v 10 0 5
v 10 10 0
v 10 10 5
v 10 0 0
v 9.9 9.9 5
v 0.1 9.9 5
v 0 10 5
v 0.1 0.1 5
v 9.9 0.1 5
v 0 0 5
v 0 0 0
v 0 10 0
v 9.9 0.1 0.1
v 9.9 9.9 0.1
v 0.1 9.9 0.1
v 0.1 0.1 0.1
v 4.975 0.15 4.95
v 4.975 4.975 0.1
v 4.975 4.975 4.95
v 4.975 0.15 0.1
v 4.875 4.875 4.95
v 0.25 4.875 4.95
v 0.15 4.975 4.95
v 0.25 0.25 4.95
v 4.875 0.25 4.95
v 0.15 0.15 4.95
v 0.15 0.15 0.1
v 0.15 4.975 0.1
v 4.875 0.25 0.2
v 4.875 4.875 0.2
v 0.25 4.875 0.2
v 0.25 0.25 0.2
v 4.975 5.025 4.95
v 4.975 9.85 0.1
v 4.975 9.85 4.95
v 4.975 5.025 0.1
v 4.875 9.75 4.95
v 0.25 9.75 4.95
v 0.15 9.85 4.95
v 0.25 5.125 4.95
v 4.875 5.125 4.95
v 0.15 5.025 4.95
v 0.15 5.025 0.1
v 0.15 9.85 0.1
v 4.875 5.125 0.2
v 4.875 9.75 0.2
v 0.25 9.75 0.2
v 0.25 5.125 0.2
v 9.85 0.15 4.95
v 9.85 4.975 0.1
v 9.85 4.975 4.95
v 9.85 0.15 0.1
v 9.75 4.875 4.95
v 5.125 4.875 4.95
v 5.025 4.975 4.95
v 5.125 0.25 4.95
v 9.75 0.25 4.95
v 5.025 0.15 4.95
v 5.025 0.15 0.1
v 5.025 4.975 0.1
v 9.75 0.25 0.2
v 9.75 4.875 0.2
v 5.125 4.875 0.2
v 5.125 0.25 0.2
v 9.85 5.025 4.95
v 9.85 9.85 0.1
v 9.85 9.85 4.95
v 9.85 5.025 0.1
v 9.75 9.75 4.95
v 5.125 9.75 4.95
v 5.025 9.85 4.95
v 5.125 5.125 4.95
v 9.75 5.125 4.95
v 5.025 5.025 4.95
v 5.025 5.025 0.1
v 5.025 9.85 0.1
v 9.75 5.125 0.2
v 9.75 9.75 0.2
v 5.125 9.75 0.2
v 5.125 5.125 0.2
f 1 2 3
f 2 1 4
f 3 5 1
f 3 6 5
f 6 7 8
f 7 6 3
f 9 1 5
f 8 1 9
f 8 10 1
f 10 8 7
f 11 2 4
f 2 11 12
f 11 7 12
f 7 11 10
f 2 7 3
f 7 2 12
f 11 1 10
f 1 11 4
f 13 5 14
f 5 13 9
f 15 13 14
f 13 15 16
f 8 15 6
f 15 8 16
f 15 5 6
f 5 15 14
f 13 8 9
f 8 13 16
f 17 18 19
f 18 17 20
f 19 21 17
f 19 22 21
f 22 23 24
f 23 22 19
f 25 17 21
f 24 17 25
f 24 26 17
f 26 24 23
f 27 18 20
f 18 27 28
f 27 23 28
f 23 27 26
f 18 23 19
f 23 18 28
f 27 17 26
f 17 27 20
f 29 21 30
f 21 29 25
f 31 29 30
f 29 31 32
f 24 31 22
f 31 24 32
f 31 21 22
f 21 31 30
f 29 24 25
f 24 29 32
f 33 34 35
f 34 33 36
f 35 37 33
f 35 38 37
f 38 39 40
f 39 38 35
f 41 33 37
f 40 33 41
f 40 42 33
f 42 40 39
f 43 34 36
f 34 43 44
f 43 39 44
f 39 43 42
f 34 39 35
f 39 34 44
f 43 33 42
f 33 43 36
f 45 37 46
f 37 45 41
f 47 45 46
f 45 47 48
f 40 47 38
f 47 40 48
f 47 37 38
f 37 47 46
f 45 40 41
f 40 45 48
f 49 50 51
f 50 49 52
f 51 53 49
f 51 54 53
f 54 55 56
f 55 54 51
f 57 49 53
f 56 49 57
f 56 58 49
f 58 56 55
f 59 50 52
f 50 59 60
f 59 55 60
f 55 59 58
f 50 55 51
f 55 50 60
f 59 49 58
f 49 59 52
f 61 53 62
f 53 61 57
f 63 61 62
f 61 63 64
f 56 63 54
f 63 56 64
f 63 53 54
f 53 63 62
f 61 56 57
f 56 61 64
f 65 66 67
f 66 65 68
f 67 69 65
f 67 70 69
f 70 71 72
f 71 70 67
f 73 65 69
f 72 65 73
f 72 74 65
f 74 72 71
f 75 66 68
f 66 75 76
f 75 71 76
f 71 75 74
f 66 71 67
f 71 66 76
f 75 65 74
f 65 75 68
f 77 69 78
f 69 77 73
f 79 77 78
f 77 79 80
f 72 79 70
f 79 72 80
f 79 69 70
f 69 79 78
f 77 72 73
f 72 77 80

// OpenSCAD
/*
 * A basic organizer print of a box with four box inserts.
 *
 * Author: Tarkan Al-Kazily - tarkan.alkazily (at) gmail.com
 */

// Configurable parameters

/* [Outer Box Dimensions] */
outer_x = 10.0; // width
outer_y = 10.0; // depth
outer_z = 5.0;  // height


/* [Insert Boxes Coordinate] */
// Defines the 2d coordinate the four inserts meet at in the box
insert_intersect_x = 5.0; 
insert_intersect_y = 5.0; 

/* [Other Constants] */
WALL_THICKNESS = 0.1;
INSERT_SPACING = 0.050;

/* [Render Controls] */
RENDER_OUTER_BOX = true;
RENDER_INSERTS = true;
RENDER_JUST_FIRST_INSERT = false;

/*
 * Declarations
 */
if (RENDER_OUTER_BOX) {
    outer_box();
}

if (RENDER_INSERTS) {
    inserts();
}


/*
 * Modules
 */
module _box(x, y, z) {
    difference() {
        cube([x, y, z], center=false);
        translate([WALL_THICKNESS, WALL_THICKNESS, WALL_THICKNESS]) {
            cube([x - 2 * WALL_THICKNESS, y - 2 * WALL_THICKNESS, z], center=false);
        }
    }
}

module outer_box() {
    _box(outer_x, outer_y, outer_z);
}

module inserts() {
    for (i = [0:1], j = [0:1]) {
        // Calculate the needed outer dimension of the insert
        delta_x = i == 0 ? insert_intersect_x : outer_x - insert_intersect_x;
        x = delta_x - WALL_THICKNESS - INSERT_SPACING - INSERT_SPACING / 2;

        delta_y = i == 0 ? insert_intersect_y : outer_y - insert_intersect_y;
        y = delta_y - WALL_THICKNESS - INSERT_SPACING - INSERT_SPACING / 2;

        z = outer_z - WALL_THICKNESS - INSERT_SPACING;

        translate_x = i == 0 ? WALL_THICKNESS + INSERT_SPACING : insert_intersect_x + INSERT_SPACING / 2;
        translate_y = j == 0 ? WALL_THICKNESS + INSERT_SPACING : insert_intersect_y + INSERT_SPACING / 2;

        if (!RENDER_JUST_FIRST_INSERT || (i == 0 && j == 0)) {
            translate([translate_x, translate_y, WALL_THICKNESS]) {
                _box(x, y, z);
            }
        }
    }
}
